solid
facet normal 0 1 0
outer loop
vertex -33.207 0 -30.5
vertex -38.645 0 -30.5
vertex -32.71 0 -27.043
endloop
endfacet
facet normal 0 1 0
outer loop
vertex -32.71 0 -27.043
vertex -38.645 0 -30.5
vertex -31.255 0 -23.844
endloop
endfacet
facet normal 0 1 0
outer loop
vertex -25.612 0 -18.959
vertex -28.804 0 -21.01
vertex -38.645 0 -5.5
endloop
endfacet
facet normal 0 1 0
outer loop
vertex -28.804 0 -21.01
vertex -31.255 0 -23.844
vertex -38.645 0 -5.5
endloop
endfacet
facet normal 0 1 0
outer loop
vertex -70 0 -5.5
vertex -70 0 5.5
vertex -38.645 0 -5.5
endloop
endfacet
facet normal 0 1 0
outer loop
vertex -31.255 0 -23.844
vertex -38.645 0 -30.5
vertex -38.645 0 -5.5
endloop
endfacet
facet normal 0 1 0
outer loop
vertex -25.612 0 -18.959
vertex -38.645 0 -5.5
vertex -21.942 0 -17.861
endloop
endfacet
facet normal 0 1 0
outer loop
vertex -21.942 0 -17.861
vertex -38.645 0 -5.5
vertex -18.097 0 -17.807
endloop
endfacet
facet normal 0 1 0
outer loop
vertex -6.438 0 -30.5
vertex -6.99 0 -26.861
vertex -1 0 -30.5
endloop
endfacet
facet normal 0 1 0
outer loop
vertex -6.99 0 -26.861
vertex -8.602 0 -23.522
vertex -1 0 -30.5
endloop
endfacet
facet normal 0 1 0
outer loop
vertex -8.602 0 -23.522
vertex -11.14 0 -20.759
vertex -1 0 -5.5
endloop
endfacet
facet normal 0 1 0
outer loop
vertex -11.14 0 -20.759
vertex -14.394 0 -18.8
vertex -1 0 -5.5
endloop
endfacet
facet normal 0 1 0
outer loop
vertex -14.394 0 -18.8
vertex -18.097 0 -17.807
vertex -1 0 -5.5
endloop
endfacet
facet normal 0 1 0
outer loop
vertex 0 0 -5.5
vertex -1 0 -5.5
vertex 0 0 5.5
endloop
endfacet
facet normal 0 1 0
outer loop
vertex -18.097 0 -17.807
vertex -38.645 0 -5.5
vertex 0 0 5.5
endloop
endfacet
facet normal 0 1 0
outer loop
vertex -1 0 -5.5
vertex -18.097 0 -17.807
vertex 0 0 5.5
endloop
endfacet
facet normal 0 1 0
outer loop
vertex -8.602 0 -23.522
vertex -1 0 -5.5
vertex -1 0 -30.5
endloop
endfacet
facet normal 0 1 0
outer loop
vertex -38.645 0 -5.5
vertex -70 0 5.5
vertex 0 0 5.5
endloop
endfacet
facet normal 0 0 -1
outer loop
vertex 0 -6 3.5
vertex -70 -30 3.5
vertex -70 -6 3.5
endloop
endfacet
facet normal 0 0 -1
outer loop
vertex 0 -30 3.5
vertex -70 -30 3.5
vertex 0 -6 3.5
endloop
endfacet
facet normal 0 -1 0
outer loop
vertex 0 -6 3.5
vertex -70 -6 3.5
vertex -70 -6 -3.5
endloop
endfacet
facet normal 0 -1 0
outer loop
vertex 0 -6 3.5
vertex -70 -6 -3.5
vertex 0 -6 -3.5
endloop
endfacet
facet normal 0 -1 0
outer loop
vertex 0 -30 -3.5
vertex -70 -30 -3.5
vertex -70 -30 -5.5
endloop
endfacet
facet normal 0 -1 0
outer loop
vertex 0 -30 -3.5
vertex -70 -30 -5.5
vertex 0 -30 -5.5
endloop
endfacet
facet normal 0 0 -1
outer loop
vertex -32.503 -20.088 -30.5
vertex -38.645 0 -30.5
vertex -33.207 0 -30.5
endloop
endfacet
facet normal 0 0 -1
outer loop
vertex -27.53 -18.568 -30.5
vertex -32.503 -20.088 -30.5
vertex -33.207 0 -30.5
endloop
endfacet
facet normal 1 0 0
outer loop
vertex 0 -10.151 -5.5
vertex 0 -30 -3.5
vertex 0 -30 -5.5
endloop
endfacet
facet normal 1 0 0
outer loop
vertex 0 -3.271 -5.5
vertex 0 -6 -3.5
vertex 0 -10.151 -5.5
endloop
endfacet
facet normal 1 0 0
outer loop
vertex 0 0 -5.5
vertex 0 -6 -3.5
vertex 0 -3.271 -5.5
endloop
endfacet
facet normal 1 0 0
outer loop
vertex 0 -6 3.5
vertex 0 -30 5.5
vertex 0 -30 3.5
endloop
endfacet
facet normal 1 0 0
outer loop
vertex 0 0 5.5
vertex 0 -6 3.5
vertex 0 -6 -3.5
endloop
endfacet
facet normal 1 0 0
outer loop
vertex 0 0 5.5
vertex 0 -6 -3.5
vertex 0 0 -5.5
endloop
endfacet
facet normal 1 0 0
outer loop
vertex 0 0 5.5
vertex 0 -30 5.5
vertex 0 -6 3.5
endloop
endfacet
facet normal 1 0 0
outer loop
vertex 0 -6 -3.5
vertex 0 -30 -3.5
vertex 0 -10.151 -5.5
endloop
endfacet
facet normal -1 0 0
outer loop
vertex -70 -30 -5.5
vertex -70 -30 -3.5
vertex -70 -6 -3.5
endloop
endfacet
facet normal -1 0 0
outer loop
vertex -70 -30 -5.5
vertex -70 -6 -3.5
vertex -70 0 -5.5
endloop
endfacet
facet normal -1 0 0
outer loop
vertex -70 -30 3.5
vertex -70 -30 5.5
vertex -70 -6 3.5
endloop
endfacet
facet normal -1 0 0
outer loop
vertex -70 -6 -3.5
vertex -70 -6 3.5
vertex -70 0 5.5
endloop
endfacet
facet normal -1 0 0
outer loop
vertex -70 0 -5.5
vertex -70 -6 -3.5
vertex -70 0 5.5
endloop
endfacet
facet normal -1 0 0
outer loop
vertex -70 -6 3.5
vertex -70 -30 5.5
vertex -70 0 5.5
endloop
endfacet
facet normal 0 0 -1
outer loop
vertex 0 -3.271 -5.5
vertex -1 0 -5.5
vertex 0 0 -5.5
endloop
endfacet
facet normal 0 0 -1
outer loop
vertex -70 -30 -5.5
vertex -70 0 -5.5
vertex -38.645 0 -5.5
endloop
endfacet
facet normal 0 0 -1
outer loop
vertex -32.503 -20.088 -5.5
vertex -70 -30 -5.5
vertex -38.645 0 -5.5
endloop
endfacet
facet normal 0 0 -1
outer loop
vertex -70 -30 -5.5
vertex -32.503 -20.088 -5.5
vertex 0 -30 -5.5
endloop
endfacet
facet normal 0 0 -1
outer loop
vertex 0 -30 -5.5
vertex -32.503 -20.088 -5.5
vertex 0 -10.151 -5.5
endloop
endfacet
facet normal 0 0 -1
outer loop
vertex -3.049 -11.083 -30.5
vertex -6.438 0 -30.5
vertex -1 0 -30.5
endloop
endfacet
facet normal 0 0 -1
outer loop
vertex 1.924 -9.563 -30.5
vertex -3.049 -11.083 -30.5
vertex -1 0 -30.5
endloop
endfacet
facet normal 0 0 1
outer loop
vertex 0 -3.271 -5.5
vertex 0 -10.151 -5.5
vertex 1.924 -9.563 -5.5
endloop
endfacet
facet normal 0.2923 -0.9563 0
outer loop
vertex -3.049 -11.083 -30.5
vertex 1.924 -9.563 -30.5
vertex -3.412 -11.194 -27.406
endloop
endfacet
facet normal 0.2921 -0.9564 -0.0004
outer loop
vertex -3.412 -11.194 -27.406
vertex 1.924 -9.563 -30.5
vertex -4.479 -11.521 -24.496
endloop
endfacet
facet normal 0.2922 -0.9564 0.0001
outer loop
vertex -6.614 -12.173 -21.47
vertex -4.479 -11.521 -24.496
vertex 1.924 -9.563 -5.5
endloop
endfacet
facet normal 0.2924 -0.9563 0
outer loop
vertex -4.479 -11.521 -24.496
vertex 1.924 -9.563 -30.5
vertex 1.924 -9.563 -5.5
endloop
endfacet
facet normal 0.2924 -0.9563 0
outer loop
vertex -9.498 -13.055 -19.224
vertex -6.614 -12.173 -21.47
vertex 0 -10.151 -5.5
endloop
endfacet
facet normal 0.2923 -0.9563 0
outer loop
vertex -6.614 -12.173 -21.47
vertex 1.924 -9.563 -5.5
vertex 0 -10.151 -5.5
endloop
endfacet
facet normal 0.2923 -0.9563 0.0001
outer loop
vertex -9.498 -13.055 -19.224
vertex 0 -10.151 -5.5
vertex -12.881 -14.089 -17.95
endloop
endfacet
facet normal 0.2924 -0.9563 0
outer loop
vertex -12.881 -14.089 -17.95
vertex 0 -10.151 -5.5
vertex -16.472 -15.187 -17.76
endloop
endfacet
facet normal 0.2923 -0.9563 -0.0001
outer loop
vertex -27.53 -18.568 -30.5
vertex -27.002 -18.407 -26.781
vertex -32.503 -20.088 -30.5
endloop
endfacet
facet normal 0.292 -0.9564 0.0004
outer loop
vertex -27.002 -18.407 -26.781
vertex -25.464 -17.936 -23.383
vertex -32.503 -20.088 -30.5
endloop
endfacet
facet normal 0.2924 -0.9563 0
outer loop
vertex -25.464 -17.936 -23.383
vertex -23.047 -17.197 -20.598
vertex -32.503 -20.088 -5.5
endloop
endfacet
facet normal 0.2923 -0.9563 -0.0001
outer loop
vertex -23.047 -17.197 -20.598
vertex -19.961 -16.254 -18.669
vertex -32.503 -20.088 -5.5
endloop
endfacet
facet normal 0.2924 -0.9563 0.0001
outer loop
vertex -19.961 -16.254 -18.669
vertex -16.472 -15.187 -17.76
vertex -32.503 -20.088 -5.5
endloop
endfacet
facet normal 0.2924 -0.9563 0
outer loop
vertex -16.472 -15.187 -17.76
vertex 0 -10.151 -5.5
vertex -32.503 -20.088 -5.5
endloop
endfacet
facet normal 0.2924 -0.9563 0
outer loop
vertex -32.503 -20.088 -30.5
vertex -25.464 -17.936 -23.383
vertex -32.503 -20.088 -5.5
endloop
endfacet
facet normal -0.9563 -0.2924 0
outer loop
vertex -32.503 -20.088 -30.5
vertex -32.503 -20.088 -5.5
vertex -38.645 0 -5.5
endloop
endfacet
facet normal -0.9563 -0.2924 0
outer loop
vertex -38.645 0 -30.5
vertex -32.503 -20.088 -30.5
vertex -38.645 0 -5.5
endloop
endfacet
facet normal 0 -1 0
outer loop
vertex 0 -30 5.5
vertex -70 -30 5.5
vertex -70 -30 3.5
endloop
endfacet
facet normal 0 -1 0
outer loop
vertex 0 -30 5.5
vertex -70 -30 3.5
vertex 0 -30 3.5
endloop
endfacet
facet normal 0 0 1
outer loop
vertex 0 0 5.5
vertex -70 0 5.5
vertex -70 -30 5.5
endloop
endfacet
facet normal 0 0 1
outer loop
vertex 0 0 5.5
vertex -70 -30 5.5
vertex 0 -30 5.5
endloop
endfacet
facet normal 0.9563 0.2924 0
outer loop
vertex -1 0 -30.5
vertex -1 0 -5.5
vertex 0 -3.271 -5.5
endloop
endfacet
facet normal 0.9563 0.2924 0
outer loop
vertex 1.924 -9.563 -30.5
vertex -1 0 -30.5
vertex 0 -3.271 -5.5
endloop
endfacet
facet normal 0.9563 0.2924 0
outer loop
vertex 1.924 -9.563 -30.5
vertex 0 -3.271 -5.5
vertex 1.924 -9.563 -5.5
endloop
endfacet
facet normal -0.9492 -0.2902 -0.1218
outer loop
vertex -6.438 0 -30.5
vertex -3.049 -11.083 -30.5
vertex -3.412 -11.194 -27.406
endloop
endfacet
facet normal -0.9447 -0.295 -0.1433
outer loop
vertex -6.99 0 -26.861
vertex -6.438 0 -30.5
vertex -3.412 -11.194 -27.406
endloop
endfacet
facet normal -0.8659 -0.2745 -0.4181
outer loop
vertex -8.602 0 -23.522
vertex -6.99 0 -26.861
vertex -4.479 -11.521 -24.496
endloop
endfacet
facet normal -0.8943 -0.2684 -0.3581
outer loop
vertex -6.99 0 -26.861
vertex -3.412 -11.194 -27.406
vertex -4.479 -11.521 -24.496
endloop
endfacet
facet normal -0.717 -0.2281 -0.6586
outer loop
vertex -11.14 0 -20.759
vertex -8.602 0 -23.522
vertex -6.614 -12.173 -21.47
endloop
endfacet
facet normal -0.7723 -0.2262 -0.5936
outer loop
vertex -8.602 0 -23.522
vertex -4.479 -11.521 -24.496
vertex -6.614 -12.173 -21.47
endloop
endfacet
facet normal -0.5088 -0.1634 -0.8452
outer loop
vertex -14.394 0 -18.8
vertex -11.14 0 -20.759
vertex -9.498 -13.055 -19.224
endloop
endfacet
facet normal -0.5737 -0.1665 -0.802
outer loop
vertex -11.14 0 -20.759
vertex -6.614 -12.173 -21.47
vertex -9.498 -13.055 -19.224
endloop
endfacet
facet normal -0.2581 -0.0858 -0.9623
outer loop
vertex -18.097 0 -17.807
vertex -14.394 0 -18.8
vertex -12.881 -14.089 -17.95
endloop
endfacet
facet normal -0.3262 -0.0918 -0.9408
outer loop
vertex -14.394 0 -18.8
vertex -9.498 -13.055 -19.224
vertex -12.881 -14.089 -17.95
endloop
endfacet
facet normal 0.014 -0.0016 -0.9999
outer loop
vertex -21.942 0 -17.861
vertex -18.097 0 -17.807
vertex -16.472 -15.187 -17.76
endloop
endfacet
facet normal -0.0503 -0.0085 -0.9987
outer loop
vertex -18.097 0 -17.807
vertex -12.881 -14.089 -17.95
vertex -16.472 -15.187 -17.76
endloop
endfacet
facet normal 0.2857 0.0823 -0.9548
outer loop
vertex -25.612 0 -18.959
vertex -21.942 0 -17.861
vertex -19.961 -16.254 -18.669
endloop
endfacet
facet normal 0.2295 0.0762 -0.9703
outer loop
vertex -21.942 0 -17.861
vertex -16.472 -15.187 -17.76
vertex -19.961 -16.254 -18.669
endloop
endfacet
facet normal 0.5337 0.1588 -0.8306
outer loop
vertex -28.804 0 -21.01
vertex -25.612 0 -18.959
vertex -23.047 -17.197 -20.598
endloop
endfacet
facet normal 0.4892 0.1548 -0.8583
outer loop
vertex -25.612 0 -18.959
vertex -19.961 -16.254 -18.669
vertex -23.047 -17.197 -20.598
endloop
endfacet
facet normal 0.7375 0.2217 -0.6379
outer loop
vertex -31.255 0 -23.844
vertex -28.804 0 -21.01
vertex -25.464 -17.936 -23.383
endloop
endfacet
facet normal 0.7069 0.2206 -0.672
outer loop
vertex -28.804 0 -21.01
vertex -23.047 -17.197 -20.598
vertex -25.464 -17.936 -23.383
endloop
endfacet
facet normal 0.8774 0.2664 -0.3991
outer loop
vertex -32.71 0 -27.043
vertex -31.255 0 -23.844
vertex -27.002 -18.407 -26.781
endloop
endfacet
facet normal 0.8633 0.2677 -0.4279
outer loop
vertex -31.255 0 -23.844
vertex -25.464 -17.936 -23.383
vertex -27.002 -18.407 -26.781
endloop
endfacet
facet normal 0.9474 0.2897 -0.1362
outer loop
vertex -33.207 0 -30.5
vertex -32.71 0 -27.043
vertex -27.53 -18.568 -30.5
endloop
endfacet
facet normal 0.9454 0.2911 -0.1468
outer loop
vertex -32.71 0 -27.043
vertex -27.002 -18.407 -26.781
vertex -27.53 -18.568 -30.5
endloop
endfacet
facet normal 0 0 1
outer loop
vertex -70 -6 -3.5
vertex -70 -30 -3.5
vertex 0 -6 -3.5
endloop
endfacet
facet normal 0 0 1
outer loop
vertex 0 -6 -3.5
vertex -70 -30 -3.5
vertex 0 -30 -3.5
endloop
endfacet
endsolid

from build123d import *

# Parameters (mm, degrees)
SKETCH_W        = 70
SKETCH_H        = 30
PAD_DEPTH       = 5.5
SKETCH001_W     = 114.652
SKETCH001_H     = 7
POCKET_DEPTH    = 24
PAD001_DEPTH    = 25
SKETCH004_R     = 12.8
POCKET001_DEPTH = 30.174648


with BuildPart() as part:
    # Sketch → Pad (new body, symmetric)
    with BuildSketch(Plane.XY):
        with Locations((-35, -15)):
            Rectangle(SKETCH_W, SKETCH_H)
    extrude(amount=PAD_DEPTH, both=True)

    # Sketch001 → Pocket (cut)
    with BuildSketch(Plane.XZ.offset(30)):
        with Locations((-38.5063, 0)):
            Rectangle(SKETCH001_W, SKETCH001_H)
    extrude(amount=-POCKET_DEPTH, mode=Mode.SUBTRACT)

    # Sketch003 → Pad001 (new body)
    with BuildSketch(Plane(origin=(0, 0, -5.5), x_dir=(1, 0, 0), z_dir=(0, 0, -1))):
        Polygon((-38.644903, 0), (-1, 0), (1.923717, 9.563048), (-32.503254, 20.088429), align=None)
        Polygon((-38.644903, 0), (-1, 0), align=None)
    extrude(amount=PAD001_DEPTH)

    # Sketch004 → Pocket001 (cut, through all)
    with BuildSketch(Plane(origin=(2.838236, -9.283451, 0), x_dir=(0.956305, 0.292372, 0), z_dir=(0.292372, -0.956305, 0))):
        with Locations((-18.956305, -30.5)):
            Circle(SKETCH004_R)
    extrude(amount=-POCKET001_DEPTH, mode=Mode.SUBTRACT)


solid = part.part
